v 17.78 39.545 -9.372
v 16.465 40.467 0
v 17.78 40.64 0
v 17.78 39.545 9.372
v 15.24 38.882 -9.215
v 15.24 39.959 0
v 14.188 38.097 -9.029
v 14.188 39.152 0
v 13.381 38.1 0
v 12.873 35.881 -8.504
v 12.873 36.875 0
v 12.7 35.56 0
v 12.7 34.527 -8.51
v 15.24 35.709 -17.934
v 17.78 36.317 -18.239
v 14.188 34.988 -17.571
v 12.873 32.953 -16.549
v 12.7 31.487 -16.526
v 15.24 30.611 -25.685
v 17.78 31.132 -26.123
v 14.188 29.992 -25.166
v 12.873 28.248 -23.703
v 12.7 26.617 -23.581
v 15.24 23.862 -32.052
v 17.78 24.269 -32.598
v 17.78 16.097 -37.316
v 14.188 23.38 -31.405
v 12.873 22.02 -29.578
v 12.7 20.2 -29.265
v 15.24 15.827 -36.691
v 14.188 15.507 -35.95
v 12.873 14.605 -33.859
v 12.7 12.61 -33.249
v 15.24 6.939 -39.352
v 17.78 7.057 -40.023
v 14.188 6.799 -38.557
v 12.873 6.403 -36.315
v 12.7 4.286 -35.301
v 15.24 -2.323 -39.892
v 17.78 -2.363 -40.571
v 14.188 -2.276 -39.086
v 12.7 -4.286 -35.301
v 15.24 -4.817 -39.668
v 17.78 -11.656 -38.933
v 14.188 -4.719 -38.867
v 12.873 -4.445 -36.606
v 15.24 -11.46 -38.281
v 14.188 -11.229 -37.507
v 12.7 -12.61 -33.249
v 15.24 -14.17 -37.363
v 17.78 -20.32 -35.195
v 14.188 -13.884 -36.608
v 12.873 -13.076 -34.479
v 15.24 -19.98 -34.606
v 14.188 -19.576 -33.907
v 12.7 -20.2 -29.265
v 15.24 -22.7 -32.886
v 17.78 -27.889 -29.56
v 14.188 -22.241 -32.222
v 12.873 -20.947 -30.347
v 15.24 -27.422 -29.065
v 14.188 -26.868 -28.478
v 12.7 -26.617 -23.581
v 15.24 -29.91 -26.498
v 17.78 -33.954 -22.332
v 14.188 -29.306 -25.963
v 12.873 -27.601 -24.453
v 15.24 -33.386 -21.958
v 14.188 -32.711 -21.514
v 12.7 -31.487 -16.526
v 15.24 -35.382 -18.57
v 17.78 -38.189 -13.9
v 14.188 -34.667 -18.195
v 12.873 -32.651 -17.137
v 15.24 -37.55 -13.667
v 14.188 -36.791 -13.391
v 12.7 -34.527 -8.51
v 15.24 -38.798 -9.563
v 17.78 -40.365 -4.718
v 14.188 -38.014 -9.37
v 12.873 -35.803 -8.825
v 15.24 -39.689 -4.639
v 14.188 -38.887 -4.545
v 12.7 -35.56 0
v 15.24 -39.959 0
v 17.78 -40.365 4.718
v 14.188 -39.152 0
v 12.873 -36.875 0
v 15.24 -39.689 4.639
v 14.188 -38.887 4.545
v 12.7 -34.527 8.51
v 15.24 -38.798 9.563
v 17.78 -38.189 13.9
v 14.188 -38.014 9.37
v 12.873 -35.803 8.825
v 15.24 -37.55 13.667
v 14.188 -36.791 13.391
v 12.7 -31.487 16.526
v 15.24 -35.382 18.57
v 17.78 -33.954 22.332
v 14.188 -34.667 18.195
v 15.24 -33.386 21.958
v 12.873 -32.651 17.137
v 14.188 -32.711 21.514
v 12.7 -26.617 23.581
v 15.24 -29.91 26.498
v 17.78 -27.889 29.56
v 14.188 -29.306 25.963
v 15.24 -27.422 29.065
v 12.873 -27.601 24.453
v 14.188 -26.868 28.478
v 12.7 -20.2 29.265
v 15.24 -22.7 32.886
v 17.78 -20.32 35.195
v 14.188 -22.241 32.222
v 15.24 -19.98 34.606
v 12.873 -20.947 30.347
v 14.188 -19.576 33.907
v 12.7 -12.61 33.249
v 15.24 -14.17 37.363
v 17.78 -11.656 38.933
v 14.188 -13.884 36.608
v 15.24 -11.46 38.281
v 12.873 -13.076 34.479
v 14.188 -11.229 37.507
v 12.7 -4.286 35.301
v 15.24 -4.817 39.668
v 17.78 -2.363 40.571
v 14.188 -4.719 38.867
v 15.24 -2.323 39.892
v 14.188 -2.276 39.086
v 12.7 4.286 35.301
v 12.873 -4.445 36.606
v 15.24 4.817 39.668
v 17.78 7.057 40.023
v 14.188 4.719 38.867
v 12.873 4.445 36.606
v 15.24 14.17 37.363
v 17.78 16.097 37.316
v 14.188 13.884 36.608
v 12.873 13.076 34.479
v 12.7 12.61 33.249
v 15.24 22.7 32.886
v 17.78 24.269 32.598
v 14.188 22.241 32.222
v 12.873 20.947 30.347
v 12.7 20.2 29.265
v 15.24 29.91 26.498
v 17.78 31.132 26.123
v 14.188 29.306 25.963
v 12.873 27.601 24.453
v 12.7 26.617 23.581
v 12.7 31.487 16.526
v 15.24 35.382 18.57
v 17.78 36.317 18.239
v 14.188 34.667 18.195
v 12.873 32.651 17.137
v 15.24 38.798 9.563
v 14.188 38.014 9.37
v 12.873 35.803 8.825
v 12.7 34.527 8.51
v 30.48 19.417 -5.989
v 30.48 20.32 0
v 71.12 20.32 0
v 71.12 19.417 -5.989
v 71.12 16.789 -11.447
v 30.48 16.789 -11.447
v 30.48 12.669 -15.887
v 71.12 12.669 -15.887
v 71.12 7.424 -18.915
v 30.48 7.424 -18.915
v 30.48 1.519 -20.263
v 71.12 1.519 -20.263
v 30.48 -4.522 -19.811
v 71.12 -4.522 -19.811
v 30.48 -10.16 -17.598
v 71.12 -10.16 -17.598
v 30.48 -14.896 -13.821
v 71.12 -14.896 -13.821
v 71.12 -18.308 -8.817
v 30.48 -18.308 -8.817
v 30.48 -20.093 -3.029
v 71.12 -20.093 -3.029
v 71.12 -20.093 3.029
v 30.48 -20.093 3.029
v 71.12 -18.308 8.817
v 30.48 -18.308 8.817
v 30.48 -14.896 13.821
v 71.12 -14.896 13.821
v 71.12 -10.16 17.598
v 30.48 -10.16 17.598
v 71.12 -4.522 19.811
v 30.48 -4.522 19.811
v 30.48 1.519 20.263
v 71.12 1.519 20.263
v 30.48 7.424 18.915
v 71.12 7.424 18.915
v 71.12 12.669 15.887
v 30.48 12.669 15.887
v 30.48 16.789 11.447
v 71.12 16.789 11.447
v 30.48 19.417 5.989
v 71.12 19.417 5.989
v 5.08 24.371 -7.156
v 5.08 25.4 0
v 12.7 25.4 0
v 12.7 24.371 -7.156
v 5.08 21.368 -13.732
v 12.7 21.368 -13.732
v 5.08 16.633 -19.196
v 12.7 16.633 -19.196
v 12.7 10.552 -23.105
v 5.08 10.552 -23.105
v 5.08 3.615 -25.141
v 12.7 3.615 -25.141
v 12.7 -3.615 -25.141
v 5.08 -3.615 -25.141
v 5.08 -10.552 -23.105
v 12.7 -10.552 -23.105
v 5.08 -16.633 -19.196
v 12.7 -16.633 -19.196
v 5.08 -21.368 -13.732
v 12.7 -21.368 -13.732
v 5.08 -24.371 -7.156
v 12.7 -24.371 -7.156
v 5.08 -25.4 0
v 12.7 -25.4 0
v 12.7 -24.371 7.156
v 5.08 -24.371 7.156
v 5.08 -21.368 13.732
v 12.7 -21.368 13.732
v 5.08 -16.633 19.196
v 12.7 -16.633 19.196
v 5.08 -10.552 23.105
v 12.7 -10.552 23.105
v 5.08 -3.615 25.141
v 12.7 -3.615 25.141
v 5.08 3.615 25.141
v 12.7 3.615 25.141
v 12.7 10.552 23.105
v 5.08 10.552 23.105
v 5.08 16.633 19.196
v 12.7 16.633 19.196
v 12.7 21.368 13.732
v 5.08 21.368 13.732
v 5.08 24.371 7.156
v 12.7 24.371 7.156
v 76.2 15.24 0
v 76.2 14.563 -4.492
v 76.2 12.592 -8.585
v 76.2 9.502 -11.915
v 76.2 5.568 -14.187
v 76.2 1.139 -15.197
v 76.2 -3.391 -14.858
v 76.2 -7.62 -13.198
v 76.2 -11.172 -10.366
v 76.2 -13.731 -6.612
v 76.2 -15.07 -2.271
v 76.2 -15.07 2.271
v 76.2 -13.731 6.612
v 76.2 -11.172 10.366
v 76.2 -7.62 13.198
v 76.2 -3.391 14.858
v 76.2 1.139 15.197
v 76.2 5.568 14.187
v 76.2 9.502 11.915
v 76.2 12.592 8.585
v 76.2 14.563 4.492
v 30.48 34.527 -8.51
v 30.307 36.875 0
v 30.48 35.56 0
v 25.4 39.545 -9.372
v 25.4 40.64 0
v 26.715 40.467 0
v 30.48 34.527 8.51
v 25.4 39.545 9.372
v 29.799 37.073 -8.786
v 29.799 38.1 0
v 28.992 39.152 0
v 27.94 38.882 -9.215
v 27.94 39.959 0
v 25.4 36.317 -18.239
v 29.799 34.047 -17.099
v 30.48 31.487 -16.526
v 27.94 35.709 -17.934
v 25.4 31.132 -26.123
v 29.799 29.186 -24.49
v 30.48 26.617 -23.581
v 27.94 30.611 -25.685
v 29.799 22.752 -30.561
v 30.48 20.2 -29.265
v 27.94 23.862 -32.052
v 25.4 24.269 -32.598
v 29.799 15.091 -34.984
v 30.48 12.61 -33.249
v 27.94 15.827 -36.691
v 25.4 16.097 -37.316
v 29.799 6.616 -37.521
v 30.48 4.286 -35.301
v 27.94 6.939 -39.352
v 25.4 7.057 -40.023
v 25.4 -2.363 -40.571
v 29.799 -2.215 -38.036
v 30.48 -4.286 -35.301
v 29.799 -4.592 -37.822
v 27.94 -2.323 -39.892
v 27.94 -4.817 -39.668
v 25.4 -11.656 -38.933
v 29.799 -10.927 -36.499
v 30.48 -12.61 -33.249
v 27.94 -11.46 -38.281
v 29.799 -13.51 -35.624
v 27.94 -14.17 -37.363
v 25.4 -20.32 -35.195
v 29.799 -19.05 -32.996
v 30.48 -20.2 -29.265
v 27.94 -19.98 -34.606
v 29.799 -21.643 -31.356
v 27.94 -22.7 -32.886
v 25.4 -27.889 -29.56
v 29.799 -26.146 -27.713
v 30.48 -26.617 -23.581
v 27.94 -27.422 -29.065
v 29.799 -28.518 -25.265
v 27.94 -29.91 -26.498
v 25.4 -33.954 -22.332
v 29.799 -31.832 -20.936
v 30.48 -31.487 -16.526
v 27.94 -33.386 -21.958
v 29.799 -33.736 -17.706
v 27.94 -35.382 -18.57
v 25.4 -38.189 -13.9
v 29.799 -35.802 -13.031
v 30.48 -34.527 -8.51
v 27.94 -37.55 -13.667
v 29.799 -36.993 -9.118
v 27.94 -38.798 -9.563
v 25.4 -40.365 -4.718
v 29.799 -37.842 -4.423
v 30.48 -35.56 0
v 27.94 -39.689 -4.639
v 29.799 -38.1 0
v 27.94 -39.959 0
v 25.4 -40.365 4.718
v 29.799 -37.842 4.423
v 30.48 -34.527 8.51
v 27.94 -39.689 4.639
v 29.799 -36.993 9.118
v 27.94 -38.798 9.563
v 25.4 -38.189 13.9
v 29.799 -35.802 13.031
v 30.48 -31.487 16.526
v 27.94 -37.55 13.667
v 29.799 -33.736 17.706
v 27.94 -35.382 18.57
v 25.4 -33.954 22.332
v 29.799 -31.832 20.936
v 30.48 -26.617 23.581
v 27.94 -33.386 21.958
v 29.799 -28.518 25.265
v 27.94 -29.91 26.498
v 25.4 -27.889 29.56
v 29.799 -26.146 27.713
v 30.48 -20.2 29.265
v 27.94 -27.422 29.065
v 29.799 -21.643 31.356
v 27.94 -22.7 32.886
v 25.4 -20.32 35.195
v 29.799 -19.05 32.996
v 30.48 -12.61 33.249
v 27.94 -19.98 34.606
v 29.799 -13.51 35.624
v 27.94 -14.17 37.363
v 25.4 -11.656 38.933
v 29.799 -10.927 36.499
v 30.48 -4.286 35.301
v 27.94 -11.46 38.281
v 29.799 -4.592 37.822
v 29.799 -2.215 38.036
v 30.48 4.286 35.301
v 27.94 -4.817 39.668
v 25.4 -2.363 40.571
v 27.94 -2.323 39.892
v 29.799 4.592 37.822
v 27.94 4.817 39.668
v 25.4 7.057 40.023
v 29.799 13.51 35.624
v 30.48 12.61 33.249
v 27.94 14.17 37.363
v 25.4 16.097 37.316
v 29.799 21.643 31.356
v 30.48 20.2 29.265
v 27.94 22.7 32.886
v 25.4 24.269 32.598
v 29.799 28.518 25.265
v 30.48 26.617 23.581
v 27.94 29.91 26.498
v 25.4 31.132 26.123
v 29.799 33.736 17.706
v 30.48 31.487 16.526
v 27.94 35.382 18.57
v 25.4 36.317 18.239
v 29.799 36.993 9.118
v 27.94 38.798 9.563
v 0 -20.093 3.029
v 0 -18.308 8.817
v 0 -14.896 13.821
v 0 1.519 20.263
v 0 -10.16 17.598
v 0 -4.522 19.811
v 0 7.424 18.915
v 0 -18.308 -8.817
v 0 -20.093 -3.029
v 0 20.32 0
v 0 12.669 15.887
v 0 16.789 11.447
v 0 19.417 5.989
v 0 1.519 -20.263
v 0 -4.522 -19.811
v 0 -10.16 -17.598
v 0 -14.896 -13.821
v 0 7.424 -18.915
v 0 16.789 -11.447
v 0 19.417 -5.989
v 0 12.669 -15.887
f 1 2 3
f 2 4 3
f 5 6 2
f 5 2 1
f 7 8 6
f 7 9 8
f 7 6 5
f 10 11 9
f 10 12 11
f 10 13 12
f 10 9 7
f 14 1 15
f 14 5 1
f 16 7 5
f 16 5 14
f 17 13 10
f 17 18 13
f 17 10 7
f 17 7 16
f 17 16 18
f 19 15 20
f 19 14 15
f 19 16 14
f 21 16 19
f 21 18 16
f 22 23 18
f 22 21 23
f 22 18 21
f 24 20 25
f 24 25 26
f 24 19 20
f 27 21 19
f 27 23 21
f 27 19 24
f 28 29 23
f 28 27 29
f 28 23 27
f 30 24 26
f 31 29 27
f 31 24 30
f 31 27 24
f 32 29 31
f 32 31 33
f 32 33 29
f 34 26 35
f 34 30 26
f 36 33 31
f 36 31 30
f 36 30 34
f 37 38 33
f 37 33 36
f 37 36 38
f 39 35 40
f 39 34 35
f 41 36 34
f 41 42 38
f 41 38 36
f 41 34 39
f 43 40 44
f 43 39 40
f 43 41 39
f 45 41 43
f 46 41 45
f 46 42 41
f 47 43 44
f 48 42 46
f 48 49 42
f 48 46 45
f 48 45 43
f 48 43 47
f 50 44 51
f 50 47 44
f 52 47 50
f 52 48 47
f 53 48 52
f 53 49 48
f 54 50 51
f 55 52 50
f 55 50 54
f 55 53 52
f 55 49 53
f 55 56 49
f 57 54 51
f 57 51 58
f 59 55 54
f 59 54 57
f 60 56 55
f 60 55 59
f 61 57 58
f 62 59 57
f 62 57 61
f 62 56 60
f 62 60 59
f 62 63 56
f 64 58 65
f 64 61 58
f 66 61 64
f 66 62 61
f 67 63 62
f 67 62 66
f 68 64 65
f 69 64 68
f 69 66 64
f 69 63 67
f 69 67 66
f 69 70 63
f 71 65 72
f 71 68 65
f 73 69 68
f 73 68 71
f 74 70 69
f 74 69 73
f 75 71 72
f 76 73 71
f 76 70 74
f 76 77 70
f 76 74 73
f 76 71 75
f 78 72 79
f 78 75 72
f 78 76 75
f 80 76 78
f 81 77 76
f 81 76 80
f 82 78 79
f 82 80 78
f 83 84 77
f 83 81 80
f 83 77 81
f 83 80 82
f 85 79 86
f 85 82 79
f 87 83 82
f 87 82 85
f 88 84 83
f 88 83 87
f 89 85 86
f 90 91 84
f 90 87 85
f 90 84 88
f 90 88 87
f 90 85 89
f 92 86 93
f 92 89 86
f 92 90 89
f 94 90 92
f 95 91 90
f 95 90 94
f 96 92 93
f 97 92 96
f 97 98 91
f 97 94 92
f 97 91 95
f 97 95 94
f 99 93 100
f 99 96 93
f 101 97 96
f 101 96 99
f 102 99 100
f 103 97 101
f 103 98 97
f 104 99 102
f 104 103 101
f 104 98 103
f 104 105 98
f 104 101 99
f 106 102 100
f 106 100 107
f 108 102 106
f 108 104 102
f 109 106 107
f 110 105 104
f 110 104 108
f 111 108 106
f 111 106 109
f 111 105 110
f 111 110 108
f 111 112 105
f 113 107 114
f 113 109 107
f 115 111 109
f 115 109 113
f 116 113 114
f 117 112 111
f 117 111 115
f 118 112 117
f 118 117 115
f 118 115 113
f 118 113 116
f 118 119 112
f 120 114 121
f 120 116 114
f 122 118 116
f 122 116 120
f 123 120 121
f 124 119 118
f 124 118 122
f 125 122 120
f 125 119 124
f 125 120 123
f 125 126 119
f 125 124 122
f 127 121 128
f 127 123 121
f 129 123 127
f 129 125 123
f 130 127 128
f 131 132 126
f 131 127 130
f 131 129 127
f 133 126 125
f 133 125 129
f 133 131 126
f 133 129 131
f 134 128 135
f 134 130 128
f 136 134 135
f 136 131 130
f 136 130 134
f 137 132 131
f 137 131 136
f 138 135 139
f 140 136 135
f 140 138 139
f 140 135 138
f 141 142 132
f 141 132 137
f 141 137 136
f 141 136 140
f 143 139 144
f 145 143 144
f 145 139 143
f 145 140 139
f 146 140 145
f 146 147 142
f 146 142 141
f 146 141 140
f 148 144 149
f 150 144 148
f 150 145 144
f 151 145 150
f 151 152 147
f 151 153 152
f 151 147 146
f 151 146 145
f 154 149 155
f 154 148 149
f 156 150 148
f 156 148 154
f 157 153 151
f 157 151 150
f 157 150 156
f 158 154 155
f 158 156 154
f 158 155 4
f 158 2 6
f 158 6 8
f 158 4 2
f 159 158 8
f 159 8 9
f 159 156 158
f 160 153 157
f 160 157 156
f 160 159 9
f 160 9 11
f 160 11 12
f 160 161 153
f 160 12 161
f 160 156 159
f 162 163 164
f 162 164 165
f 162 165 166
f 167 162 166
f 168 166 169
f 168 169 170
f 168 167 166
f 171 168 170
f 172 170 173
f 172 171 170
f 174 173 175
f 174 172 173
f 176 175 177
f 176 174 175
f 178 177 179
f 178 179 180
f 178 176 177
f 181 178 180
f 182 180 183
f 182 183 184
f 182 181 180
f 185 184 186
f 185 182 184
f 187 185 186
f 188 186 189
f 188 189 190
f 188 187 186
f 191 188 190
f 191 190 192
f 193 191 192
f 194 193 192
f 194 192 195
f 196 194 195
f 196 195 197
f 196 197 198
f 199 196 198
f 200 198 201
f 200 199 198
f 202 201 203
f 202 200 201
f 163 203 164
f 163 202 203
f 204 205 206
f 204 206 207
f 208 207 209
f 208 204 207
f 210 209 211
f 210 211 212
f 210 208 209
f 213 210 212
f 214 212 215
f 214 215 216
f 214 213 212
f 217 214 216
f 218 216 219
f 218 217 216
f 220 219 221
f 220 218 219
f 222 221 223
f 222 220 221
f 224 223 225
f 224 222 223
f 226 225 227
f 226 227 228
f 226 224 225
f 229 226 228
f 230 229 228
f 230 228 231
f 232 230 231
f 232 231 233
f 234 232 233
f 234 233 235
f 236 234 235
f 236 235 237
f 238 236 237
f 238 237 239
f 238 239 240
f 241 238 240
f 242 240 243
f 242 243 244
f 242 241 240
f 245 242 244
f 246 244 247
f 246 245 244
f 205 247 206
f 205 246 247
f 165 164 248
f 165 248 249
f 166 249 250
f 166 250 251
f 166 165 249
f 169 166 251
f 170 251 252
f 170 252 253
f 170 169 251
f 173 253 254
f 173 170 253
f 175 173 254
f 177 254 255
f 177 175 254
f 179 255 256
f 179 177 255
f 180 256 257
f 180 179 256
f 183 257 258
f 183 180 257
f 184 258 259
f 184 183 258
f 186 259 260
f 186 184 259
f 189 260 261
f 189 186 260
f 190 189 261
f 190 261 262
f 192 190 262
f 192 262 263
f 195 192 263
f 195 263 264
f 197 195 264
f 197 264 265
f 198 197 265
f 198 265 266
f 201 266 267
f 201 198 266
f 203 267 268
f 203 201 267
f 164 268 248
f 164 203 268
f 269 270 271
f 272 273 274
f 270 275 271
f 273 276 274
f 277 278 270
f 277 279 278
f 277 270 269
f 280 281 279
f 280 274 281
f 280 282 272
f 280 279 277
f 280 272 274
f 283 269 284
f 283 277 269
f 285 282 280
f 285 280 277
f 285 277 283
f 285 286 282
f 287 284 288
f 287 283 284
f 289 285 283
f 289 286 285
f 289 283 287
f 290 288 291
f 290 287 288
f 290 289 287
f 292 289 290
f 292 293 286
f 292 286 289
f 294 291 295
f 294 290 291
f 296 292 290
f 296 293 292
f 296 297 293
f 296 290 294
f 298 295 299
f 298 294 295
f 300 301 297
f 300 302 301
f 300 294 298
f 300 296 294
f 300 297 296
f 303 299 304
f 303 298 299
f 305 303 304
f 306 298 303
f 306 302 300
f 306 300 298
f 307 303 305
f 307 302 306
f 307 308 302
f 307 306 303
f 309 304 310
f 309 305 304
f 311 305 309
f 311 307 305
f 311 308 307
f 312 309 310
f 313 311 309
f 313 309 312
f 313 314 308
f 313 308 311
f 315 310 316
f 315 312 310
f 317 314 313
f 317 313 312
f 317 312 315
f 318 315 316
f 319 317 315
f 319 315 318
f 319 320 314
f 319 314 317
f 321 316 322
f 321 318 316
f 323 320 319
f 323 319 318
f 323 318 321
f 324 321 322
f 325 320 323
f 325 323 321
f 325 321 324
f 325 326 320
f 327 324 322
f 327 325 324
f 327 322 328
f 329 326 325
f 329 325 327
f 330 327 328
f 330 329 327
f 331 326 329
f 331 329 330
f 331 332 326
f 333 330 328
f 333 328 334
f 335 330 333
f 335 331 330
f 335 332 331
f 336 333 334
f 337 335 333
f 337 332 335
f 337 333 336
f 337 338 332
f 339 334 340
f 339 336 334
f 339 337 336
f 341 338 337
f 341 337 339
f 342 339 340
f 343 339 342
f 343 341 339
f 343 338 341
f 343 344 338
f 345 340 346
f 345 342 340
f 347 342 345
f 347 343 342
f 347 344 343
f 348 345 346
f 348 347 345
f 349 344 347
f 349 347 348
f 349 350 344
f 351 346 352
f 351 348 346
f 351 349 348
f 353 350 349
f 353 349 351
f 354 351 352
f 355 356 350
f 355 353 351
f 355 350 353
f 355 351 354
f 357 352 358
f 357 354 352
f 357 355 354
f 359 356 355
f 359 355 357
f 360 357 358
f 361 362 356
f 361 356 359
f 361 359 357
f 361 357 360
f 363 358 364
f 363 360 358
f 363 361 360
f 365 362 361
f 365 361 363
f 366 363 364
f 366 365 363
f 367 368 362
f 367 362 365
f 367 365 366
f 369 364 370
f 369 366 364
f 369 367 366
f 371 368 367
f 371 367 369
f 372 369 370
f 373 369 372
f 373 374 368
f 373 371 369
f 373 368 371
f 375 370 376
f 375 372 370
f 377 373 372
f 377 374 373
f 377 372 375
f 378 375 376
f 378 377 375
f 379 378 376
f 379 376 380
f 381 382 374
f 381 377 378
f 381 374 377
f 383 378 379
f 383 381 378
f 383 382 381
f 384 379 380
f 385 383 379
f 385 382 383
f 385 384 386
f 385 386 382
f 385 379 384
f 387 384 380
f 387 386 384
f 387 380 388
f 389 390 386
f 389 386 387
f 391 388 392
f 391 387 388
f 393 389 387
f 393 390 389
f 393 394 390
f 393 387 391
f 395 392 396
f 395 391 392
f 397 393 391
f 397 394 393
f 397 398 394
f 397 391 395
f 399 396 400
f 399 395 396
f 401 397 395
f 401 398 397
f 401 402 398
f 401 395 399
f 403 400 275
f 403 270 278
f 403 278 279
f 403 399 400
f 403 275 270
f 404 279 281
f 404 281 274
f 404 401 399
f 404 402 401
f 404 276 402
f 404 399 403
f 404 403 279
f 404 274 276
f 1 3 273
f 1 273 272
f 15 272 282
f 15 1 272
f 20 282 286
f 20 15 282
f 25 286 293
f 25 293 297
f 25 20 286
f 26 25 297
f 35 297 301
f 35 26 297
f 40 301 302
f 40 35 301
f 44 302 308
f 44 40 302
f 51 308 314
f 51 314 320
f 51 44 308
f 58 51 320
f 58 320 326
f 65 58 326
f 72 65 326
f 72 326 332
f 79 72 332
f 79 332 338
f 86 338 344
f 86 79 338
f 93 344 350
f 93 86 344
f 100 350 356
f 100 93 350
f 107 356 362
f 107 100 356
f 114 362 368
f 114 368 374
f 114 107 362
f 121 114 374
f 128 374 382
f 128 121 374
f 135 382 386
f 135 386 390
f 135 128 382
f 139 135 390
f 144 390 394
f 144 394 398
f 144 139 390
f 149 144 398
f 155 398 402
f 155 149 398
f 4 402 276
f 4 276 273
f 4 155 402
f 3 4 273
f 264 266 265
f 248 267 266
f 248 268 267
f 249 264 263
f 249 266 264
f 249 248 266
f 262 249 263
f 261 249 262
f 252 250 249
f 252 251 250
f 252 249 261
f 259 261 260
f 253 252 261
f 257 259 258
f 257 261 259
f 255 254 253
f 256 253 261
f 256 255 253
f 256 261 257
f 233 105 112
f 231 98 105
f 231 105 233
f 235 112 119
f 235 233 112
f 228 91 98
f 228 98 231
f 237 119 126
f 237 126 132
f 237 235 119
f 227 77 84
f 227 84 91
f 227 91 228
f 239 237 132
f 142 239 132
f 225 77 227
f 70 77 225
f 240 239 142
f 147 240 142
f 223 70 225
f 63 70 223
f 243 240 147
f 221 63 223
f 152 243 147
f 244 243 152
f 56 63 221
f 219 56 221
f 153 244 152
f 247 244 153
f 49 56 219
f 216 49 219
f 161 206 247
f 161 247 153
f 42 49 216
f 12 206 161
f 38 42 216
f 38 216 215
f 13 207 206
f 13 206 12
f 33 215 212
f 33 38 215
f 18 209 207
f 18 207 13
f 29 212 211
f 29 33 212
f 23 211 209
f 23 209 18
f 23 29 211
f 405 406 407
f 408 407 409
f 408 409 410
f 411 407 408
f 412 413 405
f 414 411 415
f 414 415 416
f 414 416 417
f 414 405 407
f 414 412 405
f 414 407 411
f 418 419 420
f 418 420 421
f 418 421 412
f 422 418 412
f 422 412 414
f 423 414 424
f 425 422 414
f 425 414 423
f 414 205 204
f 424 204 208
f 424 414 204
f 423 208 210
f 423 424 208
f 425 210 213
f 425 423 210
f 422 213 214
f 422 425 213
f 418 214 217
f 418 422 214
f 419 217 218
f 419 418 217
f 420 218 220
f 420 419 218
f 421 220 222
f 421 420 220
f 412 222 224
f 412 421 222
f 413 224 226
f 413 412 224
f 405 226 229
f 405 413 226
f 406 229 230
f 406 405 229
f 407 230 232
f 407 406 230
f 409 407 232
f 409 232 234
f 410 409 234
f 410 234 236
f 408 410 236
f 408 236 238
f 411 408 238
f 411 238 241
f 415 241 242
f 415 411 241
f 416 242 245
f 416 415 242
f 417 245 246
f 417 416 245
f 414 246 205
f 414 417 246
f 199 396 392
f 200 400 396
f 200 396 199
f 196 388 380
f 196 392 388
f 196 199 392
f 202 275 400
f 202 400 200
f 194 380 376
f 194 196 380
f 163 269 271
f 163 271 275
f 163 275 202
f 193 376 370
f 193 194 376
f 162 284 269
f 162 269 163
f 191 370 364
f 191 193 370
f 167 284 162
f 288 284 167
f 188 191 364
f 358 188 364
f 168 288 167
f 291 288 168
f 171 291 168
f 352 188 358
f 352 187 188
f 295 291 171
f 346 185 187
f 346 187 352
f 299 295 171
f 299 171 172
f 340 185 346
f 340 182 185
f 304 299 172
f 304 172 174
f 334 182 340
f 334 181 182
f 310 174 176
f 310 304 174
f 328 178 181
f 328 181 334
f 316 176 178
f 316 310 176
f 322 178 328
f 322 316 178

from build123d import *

# Parameters (mm, degrees)
F2_SIZE2 = 5.08
F2_SIZE  = 5.08
F3_R     = 5.08
F4_SIZE  = 5.08


with BuildPart() as f1:
    # F0 (on Top) → F1 (revolve)
    with BuildSketch(Plane.XY):
        Polygon((0, 25.4), (0, 0), (76.2, 0), (76.2, 20.32), (30.48, 20.32), (30.48, 40.64), (12.7, 40.64), (12.7, 25.4), align=None)
    revolve(axis=Axis((38.1, 0, 0), (-1, 0, 0)))

    # F2
    f2_edges = [f1.edges().sort_by_distance(p)[0] for p in [
        (76.2, -20.32, 0),
    ]]
    chamfer(f2_edges, length=F2_SIZE, length2=F2_SIZE2)

    # F3
    f3_edges = [f1.edges().sort_by_distance(p)[0] for p in [
        (12.7, -40.64, 0),
        (30.48, -40.64, 0),
    ]]
    fillet(f3_edges, radius=F3_R)

    # F4
    f4_edges = [f1.edges().sort_by_distance(p)[0] for p in [
        (0, -25.4, 0),
    ]]
    chamfer(f4_edges, length=F4_SIZE)


solid = f1.part
